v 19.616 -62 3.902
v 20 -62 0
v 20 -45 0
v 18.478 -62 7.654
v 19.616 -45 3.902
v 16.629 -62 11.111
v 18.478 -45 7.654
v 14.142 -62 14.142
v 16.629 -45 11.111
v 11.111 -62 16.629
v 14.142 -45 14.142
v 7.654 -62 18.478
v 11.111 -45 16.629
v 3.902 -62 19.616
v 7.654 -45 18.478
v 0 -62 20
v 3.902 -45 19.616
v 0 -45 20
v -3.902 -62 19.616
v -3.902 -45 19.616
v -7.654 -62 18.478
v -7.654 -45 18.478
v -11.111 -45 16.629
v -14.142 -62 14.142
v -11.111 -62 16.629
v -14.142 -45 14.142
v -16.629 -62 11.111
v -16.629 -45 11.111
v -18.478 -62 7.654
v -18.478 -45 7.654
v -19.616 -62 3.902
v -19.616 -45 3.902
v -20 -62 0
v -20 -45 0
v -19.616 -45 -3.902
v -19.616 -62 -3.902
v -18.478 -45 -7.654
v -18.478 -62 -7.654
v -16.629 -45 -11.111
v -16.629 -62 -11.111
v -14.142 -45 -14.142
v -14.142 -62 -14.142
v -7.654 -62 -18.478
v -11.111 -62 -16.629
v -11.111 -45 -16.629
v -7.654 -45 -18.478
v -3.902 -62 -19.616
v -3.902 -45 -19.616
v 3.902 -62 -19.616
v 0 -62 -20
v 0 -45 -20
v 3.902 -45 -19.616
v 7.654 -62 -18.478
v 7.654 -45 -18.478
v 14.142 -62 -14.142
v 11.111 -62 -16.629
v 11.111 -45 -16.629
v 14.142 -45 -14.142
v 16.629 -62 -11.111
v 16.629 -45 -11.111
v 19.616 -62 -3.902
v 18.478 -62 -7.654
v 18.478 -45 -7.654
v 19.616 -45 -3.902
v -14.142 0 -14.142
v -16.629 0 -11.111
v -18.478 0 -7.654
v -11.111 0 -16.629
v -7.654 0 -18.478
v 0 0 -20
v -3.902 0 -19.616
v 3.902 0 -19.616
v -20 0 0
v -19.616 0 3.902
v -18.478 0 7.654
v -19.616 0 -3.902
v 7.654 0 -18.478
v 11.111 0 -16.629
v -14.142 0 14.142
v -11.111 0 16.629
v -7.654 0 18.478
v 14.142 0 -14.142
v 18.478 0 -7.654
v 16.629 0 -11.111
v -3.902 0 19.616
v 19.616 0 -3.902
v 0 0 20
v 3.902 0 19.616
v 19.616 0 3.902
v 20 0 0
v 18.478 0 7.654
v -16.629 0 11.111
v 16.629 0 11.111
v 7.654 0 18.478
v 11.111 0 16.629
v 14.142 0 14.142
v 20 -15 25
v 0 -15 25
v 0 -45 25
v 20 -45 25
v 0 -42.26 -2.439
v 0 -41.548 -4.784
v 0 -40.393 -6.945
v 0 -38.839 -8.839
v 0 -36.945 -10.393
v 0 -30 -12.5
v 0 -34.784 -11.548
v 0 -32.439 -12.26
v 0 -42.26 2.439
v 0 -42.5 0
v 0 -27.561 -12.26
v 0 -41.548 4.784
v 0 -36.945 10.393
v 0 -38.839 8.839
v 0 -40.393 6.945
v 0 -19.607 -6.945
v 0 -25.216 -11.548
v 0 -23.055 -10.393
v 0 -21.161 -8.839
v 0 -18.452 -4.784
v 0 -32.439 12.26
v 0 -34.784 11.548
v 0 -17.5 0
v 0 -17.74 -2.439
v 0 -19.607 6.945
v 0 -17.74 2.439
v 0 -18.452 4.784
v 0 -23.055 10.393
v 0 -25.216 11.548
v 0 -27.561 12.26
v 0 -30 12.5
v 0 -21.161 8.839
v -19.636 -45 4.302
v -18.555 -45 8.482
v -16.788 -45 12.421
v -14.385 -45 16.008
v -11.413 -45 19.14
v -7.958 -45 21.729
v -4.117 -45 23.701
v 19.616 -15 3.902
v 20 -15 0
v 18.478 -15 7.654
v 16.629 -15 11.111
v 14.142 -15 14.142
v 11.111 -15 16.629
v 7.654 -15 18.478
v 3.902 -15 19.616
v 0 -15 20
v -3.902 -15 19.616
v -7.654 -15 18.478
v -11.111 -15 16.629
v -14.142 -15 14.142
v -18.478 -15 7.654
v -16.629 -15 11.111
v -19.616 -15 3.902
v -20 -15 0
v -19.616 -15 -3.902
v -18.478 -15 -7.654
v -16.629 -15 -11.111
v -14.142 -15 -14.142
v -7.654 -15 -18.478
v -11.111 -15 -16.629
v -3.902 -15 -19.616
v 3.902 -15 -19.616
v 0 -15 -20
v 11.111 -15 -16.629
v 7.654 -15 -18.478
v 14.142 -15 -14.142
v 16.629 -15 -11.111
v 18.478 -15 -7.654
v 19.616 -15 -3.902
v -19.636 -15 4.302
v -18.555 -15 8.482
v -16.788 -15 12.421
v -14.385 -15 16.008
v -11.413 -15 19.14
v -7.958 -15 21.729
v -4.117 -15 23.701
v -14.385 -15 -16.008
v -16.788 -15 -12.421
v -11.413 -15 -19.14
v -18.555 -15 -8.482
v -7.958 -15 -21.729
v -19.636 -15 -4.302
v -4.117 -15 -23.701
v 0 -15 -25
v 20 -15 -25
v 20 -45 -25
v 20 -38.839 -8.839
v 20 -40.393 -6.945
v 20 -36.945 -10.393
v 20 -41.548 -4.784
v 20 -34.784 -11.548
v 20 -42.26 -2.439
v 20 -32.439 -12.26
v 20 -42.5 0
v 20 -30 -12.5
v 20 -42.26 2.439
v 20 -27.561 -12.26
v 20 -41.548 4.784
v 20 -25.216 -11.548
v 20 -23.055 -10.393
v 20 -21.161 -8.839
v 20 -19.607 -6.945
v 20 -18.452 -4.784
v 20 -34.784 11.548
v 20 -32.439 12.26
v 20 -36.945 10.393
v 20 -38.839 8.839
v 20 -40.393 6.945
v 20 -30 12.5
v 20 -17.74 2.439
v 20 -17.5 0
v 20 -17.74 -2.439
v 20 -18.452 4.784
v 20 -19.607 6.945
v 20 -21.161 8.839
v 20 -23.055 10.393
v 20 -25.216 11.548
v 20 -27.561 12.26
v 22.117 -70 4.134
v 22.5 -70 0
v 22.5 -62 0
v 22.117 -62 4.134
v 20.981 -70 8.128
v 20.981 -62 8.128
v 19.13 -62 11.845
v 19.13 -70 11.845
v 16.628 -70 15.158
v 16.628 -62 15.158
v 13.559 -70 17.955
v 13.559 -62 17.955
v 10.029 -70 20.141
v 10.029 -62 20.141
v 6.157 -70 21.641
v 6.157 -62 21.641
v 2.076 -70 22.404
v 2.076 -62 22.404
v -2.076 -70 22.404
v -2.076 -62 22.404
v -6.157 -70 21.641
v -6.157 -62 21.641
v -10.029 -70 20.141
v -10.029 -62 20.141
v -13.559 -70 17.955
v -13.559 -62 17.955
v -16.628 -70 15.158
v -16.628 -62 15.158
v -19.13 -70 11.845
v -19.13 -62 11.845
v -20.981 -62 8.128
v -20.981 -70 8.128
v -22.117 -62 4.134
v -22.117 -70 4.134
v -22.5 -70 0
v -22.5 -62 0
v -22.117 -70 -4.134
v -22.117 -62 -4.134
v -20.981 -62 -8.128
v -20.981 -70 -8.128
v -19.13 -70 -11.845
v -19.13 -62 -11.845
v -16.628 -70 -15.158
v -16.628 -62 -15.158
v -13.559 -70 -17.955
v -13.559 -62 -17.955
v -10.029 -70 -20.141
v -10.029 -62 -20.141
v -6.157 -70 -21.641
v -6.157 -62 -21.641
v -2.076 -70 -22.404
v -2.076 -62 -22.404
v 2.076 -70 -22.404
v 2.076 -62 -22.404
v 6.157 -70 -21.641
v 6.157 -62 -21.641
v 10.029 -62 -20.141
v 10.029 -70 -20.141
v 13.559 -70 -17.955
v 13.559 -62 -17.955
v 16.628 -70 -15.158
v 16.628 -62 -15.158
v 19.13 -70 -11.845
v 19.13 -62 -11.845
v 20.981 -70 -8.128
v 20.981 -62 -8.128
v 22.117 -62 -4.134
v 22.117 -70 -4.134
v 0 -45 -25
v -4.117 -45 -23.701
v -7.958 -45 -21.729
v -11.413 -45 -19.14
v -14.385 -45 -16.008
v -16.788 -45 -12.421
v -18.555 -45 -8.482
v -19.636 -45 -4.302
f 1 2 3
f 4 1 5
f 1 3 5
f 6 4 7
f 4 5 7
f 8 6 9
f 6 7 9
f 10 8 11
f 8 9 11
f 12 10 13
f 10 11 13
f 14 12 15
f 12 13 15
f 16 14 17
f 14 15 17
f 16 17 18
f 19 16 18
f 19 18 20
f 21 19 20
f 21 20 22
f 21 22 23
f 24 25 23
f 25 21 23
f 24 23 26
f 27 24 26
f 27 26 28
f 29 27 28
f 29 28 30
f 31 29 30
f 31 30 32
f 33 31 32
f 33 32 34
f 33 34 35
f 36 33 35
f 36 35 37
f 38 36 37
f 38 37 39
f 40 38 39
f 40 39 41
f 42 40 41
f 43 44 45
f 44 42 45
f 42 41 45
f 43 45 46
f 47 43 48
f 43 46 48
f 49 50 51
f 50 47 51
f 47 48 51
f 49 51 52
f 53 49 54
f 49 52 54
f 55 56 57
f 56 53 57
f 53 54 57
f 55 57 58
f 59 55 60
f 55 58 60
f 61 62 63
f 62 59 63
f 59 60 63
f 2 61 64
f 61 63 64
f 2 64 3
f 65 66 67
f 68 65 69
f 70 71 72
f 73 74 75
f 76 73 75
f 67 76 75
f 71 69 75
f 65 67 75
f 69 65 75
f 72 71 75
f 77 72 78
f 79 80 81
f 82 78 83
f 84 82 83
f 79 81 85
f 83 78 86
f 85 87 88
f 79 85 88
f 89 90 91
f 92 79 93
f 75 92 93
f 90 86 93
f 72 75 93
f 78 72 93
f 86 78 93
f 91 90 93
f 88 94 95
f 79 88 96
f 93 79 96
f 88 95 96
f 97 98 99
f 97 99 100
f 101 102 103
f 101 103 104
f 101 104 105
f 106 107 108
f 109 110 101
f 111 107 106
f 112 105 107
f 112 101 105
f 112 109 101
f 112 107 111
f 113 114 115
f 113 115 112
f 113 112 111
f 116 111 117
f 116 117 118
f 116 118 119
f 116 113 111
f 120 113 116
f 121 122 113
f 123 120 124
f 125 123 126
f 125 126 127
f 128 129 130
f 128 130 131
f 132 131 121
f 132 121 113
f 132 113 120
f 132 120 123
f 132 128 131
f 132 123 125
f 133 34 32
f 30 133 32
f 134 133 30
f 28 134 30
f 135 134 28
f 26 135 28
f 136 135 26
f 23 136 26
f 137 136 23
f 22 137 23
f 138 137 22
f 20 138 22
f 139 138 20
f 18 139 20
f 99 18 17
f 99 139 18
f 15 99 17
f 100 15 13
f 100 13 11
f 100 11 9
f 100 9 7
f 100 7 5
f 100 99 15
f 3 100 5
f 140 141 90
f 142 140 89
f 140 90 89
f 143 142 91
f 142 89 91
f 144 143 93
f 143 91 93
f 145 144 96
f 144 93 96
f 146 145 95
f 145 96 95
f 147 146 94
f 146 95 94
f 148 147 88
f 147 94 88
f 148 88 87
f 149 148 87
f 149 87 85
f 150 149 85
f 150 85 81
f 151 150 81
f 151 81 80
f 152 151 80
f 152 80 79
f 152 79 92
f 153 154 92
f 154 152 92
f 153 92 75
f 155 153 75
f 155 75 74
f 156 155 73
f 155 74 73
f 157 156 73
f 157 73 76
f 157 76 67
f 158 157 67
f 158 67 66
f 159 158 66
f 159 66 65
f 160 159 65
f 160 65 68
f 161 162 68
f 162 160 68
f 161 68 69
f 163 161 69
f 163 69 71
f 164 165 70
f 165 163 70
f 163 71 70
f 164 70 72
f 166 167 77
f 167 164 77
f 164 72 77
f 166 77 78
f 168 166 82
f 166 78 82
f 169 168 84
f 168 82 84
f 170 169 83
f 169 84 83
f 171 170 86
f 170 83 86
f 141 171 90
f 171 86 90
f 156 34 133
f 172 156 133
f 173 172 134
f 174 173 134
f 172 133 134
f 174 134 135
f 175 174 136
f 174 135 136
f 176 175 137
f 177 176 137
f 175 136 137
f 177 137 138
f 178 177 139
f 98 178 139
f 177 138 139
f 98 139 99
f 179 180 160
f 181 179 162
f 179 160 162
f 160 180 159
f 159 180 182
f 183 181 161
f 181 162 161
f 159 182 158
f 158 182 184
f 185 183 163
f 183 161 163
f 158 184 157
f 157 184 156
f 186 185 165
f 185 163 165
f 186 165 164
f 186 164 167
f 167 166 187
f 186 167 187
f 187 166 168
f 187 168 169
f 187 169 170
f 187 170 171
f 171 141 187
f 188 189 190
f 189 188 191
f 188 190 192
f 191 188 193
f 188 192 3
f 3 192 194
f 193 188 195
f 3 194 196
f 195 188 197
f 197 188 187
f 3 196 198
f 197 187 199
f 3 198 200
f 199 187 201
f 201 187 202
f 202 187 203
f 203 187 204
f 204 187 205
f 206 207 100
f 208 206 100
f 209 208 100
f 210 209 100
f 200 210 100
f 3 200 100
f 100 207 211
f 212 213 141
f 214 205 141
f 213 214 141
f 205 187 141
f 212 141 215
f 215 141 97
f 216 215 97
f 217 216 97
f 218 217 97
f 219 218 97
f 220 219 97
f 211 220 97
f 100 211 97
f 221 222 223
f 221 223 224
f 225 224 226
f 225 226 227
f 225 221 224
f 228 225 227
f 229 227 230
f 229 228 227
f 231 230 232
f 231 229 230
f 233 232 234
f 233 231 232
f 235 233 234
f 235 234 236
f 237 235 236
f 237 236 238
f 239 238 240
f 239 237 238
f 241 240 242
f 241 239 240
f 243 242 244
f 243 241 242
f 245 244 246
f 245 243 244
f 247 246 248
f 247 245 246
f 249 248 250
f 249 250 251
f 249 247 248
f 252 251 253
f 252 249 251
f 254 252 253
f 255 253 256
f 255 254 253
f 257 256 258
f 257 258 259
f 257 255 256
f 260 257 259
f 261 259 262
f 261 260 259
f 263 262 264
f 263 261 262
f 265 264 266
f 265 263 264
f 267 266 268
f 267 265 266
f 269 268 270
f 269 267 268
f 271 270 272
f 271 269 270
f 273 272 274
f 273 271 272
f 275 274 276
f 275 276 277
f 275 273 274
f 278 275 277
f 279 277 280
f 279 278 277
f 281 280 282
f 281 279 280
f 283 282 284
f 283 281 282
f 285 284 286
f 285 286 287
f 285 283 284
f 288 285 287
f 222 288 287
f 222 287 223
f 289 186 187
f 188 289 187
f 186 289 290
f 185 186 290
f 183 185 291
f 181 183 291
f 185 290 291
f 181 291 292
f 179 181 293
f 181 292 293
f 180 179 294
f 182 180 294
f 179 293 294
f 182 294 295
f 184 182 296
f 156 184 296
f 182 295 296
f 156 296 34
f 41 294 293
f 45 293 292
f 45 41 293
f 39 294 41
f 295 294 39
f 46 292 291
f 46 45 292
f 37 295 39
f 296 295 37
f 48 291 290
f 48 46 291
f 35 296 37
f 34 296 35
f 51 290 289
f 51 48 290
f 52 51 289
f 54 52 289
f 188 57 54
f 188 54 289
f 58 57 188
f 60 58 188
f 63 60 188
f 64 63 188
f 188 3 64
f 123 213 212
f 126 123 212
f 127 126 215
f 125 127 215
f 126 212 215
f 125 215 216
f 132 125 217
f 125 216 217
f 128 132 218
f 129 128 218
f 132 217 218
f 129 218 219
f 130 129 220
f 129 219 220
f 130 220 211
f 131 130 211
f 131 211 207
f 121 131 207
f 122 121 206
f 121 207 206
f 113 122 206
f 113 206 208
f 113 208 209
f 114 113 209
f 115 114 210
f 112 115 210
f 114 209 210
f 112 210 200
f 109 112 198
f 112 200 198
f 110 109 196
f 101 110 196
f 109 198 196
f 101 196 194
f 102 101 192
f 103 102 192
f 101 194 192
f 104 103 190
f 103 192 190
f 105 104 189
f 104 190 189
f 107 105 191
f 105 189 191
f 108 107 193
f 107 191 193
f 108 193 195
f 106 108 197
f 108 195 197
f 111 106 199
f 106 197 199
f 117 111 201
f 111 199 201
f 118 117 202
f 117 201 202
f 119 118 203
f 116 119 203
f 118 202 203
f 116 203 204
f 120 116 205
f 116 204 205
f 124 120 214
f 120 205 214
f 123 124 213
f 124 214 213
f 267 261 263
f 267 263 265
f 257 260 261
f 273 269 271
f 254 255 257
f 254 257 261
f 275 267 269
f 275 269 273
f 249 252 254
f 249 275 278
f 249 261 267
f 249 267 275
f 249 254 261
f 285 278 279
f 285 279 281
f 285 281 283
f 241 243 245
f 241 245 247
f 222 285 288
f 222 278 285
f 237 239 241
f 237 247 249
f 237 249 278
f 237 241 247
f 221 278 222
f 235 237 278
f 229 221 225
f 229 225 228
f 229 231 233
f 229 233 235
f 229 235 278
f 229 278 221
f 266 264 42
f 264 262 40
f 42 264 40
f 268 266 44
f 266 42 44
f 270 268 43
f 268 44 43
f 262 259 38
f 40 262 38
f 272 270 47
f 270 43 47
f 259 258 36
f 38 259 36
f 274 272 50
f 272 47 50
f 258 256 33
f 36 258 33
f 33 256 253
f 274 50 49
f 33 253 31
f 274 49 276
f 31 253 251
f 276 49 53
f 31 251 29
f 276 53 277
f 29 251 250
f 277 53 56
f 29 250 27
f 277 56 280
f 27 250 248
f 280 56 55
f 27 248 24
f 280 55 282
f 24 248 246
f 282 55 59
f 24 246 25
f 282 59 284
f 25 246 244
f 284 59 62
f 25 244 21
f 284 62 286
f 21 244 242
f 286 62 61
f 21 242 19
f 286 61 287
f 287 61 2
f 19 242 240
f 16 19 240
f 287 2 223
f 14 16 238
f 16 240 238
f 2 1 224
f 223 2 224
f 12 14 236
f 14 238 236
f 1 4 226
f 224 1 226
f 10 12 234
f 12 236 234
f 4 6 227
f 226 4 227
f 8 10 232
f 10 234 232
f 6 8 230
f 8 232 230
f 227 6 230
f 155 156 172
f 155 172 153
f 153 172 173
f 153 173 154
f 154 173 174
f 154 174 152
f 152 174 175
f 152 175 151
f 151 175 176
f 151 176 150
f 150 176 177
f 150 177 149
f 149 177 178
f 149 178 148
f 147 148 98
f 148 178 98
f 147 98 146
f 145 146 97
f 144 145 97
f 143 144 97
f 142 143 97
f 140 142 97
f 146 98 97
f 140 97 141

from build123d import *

# Parameters (mm, degrees)
F0_R      = 20
F1_DEPTH  = 70
F3_W      = 40
F3_H      = 50
F4_DEPTH  = 30
F5_R      = 12.5
F6_DEPTH  = 20
F8_DEPTH  = 30
F9_R      = 22.5
F10_DEPTH = 8


with BuildPart() as f1:
    # F0 (on Front) → F1 (new body)
    with BuildSketch(Plane.XZ):
        Circle(F0_R)
    extrude(amount=F1_DEPTH)

    # F3 (on offset) → F4 (join)
    with BuildSketch(Plane.XZ.offset(15)):
        Rectangle(F3_W, F3_H)
    extrude(amount=F4_DEPTH)

    # F5 (on face) → F6 (cut)
    with BuildSketch(Plane.YZ.offset(20)):
        with Locations((-30, 0)):
            Circle(F5_R)
    extrude(amount=-F6_DEPTH, mode=Mode.SUBTRACT)

    # F7 (on face) → F8 (cut, through all)
    with BuildSketch(Plane.XZ.offset(45)):
        with BuildLine():
            ThreePointArc((0, -25), (-14.384763, -16.007811), (-20, 0))
            Line((-20, 0), (-20, -25))
            Line((-20, -25), (0, -25))
        make_face()
        with BuildLine():
            ThreePointArc((-20, 0), (-14.384763, 16.007811), (0, 25))
            Line((0, 25), (-20, 25))
            Line((-20, 25), (-20, 0))
        make_face()
    extrude(amount=-F8_DEPTH, mode=Mode.SUBTRACT)

    # F9 (on face) → F10 (join)
    with BuildSketch(Plane.XZ.offset(70)):
        Circle(F9_R)
    extrude(amount=-F10_DEPTH)


solid = f1.part
